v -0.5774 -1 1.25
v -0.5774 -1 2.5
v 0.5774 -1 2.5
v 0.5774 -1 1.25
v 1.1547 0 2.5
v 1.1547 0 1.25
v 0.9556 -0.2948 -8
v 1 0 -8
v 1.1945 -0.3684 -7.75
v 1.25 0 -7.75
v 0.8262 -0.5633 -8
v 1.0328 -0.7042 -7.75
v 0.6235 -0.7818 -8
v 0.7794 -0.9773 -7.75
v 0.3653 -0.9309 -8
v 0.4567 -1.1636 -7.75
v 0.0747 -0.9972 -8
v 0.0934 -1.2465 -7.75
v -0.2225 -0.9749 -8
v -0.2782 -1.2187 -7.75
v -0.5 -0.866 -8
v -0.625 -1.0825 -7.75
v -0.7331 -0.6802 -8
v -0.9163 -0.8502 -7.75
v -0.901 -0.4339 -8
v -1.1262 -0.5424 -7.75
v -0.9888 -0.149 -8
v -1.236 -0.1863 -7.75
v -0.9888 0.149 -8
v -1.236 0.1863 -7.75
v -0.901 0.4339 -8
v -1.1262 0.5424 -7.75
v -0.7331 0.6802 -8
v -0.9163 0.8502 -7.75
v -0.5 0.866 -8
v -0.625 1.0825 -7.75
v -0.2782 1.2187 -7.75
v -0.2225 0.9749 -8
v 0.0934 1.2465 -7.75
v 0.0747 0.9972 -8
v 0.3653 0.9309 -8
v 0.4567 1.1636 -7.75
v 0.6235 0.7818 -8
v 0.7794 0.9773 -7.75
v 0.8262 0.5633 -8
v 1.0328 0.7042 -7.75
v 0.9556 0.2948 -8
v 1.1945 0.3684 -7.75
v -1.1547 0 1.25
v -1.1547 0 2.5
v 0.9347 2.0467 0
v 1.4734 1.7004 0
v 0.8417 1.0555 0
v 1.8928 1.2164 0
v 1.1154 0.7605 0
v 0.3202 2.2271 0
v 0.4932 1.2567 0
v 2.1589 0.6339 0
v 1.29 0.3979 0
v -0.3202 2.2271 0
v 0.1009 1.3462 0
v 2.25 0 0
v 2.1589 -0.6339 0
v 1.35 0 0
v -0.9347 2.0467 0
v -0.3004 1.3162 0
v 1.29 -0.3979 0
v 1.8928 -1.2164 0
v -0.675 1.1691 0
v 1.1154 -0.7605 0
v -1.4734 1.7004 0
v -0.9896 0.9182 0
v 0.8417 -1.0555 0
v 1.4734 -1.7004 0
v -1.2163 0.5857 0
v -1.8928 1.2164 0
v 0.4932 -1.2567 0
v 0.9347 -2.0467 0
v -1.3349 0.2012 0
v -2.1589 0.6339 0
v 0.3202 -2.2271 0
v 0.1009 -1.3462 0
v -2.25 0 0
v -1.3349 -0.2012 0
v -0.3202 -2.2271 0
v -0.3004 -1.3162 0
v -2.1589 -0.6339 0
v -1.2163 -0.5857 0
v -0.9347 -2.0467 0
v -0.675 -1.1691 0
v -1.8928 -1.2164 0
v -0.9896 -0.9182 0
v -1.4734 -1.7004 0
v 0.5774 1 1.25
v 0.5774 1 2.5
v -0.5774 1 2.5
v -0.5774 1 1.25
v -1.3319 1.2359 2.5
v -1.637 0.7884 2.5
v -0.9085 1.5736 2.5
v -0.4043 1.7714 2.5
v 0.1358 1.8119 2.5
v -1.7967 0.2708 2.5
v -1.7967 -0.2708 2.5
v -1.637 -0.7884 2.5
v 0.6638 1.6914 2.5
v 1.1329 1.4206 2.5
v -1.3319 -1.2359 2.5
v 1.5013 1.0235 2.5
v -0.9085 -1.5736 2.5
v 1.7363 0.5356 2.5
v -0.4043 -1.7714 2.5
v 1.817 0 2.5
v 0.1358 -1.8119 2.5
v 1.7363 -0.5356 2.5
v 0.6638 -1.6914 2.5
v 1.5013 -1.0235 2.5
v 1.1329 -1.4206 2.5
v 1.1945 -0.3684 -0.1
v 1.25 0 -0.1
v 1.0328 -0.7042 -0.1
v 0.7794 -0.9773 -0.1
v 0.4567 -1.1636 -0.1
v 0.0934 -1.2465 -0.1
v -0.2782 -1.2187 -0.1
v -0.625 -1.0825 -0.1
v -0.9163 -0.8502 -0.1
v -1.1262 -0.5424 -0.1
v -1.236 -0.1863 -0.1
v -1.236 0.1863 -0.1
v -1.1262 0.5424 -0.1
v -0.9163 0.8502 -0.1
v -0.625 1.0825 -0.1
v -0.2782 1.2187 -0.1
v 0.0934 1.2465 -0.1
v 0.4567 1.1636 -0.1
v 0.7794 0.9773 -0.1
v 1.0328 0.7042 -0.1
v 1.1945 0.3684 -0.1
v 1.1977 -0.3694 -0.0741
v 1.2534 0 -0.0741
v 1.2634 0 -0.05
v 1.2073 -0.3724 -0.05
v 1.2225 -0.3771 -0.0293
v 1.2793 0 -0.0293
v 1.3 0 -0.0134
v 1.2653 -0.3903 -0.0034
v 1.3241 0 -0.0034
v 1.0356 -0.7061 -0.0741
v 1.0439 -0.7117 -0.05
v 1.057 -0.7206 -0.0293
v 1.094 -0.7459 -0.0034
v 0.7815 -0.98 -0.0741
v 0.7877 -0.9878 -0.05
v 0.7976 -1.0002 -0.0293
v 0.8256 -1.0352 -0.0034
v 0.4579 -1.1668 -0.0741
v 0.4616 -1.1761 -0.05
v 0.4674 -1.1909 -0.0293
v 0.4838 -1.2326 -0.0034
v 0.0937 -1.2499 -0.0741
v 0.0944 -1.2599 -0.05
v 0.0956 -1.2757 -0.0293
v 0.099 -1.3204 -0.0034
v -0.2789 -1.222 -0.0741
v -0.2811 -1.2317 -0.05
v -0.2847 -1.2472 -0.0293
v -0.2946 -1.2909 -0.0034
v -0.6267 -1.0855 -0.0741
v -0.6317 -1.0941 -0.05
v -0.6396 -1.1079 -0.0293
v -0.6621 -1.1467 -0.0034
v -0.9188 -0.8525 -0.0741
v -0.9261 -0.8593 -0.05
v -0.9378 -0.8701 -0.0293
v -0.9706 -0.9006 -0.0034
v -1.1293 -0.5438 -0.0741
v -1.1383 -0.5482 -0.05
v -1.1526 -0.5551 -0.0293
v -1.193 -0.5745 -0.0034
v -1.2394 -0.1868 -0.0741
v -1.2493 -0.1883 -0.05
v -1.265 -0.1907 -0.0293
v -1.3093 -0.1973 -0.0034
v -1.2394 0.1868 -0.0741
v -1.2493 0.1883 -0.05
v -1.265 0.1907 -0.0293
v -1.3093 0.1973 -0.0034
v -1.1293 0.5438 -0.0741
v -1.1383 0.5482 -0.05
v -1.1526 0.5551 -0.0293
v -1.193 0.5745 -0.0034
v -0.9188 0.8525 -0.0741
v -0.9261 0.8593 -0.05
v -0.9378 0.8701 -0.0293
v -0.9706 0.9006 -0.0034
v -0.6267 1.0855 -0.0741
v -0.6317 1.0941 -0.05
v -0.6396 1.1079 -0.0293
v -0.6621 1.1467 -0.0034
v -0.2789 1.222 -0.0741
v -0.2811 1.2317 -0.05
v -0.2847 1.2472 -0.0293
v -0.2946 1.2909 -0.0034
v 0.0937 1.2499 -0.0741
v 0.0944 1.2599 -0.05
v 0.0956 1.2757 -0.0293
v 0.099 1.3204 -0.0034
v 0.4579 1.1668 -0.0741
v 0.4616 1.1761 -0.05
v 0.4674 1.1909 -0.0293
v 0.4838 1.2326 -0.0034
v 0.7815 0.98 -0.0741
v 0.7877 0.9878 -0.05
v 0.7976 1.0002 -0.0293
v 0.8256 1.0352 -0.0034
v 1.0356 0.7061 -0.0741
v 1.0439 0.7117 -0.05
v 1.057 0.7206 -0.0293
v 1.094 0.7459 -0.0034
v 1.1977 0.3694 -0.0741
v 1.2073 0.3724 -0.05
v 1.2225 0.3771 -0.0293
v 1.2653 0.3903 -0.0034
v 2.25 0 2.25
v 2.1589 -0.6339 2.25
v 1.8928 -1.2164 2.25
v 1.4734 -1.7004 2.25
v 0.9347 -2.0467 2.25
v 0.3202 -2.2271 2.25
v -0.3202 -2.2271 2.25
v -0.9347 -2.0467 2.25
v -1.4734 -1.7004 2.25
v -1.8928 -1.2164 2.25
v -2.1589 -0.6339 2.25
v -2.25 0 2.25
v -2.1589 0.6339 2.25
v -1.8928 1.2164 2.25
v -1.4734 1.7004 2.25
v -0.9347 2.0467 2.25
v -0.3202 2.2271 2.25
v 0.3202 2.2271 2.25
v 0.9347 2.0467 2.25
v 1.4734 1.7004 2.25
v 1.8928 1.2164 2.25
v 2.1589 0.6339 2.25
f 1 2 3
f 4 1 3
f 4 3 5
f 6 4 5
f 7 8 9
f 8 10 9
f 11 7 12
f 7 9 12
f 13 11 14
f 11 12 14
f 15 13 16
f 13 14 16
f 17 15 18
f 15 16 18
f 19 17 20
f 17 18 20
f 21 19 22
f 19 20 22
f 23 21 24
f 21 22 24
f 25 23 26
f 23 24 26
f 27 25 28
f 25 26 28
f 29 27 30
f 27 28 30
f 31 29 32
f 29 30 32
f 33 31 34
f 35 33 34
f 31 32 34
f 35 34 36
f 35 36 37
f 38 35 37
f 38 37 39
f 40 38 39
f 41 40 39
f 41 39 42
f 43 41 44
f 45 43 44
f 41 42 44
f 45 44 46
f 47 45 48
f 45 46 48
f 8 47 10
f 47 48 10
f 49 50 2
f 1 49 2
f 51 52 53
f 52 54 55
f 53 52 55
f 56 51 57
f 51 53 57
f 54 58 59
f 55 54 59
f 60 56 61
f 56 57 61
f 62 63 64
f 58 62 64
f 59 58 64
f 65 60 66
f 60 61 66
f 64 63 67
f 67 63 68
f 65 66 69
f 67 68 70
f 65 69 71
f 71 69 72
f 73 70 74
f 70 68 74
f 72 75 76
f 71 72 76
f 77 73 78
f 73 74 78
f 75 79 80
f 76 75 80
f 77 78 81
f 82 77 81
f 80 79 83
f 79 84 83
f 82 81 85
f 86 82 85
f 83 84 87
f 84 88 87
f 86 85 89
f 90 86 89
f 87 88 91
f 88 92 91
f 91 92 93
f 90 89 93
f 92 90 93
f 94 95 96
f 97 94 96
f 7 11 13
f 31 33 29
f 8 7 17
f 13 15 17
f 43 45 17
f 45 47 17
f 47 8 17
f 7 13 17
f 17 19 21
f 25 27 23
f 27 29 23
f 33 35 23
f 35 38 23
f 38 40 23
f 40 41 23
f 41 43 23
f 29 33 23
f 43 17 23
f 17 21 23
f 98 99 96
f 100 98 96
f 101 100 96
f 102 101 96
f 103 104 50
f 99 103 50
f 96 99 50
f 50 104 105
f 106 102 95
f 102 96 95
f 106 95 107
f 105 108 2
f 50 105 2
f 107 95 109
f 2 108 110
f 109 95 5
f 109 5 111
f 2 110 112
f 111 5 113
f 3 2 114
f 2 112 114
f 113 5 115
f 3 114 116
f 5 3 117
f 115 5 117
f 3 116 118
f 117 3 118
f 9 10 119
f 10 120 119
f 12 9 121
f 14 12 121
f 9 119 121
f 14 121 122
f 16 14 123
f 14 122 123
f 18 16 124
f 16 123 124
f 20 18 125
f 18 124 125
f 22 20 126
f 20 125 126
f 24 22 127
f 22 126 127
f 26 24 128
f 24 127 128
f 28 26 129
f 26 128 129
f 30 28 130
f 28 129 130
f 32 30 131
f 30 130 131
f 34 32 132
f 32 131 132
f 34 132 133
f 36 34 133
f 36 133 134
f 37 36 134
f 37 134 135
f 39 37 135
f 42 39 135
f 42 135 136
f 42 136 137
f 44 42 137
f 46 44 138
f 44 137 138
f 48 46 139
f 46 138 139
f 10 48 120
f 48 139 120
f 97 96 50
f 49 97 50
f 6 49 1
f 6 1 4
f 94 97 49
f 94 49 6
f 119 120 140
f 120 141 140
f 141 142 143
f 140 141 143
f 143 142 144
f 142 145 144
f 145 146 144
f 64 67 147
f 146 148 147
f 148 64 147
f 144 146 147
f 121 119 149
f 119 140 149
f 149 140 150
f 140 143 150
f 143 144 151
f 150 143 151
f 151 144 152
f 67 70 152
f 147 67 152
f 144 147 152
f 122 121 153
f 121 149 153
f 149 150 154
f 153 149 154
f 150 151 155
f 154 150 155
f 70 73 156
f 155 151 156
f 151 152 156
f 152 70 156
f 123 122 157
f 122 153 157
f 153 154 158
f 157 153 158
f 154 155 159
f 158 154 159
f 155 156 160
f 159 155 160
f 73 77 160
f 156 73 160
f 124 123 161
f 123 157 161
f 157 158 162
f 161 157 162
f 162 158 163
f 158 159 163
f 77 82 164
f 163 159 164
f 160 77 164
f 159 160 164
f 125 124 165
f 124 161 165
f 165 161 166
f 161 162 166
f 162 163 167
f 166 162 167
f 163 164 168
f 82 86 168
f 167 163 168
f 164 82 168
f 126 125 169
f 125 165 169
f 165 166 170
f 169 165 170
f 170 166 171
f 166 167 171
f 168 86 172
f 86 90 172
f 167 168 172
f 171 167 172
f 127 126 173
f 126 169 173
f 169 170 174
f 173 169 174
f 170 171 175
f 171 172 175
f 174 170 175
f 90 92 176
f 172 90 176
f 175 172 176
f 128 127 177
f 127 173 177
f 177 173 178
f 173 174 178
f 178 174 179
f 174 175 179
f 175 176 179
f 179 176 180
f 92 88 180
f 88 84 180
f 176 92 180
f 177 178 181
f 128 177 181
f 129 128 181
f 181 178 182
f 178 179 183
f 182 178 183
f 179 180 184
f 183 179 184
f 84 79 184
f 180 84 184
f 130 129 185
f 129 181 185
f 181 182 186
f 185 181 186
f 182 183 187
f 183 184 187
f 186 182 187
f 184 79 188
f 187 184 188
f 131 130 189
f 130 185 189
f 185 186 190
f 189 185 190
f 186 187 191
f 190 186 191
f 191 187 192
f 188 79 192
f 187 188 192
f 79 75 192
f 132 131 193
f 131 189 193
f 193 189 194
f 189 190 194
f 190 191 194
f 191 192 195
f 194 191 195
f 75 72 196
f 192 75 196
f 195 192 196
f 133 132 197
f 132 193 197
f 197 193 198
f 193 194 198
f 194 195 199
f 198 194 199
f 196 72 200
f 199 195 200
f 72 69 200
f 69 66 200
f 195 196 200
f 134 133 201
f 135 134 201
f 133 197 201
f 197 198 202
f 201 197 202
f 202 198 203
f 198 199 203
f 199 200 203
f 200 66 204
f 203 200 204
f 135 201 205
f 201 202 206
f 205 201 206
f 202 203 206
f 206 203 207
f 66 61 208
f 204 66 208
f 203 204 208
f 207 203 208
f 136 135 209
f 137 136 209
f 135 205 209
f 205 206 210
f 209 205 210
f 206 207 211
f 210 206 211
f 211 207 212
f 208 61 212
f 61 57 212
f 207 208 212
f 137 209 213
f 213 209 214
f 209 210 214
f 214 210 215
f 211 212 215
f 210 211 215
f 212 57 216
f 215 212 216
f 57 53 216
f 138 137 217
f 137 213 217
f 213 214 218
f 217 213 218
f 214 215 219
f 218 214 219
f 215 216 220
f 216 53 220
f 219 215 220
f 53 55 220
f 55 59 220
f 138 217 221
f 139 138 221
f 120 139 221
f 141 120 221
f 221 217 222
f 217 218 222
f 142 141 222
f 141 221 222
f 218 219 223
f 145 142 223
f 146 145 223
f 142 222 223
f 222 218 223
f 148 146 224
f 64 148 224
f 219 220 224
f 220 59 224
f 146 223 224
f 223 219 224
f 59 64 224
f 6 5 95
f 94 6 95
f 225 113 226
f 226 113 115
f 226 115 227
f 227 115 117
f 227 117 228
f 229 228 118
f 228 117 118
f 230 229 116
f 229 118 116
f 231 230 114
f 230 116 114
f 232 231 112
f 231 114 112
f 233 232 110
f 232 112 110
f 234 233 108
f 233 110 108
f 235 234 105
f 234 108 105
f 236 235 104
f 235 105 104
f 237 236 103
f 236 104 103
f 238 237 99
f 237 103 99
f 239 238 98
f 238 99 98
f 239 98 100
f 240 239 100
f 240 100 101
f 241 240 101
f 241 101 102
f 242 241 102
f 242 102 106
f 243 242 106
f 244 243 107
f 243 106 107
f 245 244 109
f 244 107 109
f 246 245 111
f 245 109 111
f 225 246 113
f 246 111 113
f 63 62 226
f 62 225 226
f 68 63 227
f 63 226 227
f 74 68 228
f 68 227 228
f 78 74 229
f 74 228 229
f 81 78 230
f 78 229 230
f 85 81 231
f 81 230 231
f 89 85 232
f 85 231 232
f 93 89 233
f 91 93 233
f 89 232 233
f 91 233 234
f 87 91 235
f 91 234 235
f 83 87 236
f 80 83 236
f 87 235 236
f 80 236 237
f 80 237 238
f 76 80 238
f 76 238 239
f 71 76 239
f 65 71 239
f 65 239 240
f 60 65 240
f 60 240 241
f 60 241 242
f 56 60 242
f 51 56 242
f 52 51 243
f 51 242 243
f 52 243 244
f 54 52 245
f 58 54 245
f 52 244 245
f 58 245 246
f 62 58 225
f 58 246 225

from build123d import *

# Parameters (mm, degrees)
HEX_CUT_DEPTH = 1.25


with BuildPart() as part:
    # Body_Sketch → Body_Revolve (revolve)
    with BuildSketch(Plane(origin=(0, 0, 0), x_dir=(0, 0, -1), z_dir=(1, 0, 0))):
        with BuildLine():
            Line((8, 0), (8, 1))
            Line((8, 1), (7.75, 1.25))
            Line((7.75, 1.25), (0.1, 1.25))
            ThreePointArc((0.1, 1.25), (0.029289322, 1.279289322), (0, 1.35))
            Line((0, 1.35), (0, 2.25))
            Line((0, 2.25), (-2.25, 2.25))
            Line((-2.25, 2.25), (-2.5, 1.816987298))
            Line((-2.5, 1.816987298), (-2.5, 0))
            Line((-2.5, 0), (8, 0))
        make_face()
    revolve(axis=Axis((0, 0, 0), (0, 0, -1)))

    # Key_Sketch → Hex_Cut (cut)
    with BuildSketch(Plane.XY.offset(2.5)):
        Polygon((1.154700538, 0), (0.577350269, 1), (-0.577350269, 1), (-1.154700538, 0), (-0.577350269, -1), (0.577350269, -1), align=None)
    extrude(amount=-HEX_CUT_DEPTH, mode=Mode.SUBTRACT)


solid = part.part
